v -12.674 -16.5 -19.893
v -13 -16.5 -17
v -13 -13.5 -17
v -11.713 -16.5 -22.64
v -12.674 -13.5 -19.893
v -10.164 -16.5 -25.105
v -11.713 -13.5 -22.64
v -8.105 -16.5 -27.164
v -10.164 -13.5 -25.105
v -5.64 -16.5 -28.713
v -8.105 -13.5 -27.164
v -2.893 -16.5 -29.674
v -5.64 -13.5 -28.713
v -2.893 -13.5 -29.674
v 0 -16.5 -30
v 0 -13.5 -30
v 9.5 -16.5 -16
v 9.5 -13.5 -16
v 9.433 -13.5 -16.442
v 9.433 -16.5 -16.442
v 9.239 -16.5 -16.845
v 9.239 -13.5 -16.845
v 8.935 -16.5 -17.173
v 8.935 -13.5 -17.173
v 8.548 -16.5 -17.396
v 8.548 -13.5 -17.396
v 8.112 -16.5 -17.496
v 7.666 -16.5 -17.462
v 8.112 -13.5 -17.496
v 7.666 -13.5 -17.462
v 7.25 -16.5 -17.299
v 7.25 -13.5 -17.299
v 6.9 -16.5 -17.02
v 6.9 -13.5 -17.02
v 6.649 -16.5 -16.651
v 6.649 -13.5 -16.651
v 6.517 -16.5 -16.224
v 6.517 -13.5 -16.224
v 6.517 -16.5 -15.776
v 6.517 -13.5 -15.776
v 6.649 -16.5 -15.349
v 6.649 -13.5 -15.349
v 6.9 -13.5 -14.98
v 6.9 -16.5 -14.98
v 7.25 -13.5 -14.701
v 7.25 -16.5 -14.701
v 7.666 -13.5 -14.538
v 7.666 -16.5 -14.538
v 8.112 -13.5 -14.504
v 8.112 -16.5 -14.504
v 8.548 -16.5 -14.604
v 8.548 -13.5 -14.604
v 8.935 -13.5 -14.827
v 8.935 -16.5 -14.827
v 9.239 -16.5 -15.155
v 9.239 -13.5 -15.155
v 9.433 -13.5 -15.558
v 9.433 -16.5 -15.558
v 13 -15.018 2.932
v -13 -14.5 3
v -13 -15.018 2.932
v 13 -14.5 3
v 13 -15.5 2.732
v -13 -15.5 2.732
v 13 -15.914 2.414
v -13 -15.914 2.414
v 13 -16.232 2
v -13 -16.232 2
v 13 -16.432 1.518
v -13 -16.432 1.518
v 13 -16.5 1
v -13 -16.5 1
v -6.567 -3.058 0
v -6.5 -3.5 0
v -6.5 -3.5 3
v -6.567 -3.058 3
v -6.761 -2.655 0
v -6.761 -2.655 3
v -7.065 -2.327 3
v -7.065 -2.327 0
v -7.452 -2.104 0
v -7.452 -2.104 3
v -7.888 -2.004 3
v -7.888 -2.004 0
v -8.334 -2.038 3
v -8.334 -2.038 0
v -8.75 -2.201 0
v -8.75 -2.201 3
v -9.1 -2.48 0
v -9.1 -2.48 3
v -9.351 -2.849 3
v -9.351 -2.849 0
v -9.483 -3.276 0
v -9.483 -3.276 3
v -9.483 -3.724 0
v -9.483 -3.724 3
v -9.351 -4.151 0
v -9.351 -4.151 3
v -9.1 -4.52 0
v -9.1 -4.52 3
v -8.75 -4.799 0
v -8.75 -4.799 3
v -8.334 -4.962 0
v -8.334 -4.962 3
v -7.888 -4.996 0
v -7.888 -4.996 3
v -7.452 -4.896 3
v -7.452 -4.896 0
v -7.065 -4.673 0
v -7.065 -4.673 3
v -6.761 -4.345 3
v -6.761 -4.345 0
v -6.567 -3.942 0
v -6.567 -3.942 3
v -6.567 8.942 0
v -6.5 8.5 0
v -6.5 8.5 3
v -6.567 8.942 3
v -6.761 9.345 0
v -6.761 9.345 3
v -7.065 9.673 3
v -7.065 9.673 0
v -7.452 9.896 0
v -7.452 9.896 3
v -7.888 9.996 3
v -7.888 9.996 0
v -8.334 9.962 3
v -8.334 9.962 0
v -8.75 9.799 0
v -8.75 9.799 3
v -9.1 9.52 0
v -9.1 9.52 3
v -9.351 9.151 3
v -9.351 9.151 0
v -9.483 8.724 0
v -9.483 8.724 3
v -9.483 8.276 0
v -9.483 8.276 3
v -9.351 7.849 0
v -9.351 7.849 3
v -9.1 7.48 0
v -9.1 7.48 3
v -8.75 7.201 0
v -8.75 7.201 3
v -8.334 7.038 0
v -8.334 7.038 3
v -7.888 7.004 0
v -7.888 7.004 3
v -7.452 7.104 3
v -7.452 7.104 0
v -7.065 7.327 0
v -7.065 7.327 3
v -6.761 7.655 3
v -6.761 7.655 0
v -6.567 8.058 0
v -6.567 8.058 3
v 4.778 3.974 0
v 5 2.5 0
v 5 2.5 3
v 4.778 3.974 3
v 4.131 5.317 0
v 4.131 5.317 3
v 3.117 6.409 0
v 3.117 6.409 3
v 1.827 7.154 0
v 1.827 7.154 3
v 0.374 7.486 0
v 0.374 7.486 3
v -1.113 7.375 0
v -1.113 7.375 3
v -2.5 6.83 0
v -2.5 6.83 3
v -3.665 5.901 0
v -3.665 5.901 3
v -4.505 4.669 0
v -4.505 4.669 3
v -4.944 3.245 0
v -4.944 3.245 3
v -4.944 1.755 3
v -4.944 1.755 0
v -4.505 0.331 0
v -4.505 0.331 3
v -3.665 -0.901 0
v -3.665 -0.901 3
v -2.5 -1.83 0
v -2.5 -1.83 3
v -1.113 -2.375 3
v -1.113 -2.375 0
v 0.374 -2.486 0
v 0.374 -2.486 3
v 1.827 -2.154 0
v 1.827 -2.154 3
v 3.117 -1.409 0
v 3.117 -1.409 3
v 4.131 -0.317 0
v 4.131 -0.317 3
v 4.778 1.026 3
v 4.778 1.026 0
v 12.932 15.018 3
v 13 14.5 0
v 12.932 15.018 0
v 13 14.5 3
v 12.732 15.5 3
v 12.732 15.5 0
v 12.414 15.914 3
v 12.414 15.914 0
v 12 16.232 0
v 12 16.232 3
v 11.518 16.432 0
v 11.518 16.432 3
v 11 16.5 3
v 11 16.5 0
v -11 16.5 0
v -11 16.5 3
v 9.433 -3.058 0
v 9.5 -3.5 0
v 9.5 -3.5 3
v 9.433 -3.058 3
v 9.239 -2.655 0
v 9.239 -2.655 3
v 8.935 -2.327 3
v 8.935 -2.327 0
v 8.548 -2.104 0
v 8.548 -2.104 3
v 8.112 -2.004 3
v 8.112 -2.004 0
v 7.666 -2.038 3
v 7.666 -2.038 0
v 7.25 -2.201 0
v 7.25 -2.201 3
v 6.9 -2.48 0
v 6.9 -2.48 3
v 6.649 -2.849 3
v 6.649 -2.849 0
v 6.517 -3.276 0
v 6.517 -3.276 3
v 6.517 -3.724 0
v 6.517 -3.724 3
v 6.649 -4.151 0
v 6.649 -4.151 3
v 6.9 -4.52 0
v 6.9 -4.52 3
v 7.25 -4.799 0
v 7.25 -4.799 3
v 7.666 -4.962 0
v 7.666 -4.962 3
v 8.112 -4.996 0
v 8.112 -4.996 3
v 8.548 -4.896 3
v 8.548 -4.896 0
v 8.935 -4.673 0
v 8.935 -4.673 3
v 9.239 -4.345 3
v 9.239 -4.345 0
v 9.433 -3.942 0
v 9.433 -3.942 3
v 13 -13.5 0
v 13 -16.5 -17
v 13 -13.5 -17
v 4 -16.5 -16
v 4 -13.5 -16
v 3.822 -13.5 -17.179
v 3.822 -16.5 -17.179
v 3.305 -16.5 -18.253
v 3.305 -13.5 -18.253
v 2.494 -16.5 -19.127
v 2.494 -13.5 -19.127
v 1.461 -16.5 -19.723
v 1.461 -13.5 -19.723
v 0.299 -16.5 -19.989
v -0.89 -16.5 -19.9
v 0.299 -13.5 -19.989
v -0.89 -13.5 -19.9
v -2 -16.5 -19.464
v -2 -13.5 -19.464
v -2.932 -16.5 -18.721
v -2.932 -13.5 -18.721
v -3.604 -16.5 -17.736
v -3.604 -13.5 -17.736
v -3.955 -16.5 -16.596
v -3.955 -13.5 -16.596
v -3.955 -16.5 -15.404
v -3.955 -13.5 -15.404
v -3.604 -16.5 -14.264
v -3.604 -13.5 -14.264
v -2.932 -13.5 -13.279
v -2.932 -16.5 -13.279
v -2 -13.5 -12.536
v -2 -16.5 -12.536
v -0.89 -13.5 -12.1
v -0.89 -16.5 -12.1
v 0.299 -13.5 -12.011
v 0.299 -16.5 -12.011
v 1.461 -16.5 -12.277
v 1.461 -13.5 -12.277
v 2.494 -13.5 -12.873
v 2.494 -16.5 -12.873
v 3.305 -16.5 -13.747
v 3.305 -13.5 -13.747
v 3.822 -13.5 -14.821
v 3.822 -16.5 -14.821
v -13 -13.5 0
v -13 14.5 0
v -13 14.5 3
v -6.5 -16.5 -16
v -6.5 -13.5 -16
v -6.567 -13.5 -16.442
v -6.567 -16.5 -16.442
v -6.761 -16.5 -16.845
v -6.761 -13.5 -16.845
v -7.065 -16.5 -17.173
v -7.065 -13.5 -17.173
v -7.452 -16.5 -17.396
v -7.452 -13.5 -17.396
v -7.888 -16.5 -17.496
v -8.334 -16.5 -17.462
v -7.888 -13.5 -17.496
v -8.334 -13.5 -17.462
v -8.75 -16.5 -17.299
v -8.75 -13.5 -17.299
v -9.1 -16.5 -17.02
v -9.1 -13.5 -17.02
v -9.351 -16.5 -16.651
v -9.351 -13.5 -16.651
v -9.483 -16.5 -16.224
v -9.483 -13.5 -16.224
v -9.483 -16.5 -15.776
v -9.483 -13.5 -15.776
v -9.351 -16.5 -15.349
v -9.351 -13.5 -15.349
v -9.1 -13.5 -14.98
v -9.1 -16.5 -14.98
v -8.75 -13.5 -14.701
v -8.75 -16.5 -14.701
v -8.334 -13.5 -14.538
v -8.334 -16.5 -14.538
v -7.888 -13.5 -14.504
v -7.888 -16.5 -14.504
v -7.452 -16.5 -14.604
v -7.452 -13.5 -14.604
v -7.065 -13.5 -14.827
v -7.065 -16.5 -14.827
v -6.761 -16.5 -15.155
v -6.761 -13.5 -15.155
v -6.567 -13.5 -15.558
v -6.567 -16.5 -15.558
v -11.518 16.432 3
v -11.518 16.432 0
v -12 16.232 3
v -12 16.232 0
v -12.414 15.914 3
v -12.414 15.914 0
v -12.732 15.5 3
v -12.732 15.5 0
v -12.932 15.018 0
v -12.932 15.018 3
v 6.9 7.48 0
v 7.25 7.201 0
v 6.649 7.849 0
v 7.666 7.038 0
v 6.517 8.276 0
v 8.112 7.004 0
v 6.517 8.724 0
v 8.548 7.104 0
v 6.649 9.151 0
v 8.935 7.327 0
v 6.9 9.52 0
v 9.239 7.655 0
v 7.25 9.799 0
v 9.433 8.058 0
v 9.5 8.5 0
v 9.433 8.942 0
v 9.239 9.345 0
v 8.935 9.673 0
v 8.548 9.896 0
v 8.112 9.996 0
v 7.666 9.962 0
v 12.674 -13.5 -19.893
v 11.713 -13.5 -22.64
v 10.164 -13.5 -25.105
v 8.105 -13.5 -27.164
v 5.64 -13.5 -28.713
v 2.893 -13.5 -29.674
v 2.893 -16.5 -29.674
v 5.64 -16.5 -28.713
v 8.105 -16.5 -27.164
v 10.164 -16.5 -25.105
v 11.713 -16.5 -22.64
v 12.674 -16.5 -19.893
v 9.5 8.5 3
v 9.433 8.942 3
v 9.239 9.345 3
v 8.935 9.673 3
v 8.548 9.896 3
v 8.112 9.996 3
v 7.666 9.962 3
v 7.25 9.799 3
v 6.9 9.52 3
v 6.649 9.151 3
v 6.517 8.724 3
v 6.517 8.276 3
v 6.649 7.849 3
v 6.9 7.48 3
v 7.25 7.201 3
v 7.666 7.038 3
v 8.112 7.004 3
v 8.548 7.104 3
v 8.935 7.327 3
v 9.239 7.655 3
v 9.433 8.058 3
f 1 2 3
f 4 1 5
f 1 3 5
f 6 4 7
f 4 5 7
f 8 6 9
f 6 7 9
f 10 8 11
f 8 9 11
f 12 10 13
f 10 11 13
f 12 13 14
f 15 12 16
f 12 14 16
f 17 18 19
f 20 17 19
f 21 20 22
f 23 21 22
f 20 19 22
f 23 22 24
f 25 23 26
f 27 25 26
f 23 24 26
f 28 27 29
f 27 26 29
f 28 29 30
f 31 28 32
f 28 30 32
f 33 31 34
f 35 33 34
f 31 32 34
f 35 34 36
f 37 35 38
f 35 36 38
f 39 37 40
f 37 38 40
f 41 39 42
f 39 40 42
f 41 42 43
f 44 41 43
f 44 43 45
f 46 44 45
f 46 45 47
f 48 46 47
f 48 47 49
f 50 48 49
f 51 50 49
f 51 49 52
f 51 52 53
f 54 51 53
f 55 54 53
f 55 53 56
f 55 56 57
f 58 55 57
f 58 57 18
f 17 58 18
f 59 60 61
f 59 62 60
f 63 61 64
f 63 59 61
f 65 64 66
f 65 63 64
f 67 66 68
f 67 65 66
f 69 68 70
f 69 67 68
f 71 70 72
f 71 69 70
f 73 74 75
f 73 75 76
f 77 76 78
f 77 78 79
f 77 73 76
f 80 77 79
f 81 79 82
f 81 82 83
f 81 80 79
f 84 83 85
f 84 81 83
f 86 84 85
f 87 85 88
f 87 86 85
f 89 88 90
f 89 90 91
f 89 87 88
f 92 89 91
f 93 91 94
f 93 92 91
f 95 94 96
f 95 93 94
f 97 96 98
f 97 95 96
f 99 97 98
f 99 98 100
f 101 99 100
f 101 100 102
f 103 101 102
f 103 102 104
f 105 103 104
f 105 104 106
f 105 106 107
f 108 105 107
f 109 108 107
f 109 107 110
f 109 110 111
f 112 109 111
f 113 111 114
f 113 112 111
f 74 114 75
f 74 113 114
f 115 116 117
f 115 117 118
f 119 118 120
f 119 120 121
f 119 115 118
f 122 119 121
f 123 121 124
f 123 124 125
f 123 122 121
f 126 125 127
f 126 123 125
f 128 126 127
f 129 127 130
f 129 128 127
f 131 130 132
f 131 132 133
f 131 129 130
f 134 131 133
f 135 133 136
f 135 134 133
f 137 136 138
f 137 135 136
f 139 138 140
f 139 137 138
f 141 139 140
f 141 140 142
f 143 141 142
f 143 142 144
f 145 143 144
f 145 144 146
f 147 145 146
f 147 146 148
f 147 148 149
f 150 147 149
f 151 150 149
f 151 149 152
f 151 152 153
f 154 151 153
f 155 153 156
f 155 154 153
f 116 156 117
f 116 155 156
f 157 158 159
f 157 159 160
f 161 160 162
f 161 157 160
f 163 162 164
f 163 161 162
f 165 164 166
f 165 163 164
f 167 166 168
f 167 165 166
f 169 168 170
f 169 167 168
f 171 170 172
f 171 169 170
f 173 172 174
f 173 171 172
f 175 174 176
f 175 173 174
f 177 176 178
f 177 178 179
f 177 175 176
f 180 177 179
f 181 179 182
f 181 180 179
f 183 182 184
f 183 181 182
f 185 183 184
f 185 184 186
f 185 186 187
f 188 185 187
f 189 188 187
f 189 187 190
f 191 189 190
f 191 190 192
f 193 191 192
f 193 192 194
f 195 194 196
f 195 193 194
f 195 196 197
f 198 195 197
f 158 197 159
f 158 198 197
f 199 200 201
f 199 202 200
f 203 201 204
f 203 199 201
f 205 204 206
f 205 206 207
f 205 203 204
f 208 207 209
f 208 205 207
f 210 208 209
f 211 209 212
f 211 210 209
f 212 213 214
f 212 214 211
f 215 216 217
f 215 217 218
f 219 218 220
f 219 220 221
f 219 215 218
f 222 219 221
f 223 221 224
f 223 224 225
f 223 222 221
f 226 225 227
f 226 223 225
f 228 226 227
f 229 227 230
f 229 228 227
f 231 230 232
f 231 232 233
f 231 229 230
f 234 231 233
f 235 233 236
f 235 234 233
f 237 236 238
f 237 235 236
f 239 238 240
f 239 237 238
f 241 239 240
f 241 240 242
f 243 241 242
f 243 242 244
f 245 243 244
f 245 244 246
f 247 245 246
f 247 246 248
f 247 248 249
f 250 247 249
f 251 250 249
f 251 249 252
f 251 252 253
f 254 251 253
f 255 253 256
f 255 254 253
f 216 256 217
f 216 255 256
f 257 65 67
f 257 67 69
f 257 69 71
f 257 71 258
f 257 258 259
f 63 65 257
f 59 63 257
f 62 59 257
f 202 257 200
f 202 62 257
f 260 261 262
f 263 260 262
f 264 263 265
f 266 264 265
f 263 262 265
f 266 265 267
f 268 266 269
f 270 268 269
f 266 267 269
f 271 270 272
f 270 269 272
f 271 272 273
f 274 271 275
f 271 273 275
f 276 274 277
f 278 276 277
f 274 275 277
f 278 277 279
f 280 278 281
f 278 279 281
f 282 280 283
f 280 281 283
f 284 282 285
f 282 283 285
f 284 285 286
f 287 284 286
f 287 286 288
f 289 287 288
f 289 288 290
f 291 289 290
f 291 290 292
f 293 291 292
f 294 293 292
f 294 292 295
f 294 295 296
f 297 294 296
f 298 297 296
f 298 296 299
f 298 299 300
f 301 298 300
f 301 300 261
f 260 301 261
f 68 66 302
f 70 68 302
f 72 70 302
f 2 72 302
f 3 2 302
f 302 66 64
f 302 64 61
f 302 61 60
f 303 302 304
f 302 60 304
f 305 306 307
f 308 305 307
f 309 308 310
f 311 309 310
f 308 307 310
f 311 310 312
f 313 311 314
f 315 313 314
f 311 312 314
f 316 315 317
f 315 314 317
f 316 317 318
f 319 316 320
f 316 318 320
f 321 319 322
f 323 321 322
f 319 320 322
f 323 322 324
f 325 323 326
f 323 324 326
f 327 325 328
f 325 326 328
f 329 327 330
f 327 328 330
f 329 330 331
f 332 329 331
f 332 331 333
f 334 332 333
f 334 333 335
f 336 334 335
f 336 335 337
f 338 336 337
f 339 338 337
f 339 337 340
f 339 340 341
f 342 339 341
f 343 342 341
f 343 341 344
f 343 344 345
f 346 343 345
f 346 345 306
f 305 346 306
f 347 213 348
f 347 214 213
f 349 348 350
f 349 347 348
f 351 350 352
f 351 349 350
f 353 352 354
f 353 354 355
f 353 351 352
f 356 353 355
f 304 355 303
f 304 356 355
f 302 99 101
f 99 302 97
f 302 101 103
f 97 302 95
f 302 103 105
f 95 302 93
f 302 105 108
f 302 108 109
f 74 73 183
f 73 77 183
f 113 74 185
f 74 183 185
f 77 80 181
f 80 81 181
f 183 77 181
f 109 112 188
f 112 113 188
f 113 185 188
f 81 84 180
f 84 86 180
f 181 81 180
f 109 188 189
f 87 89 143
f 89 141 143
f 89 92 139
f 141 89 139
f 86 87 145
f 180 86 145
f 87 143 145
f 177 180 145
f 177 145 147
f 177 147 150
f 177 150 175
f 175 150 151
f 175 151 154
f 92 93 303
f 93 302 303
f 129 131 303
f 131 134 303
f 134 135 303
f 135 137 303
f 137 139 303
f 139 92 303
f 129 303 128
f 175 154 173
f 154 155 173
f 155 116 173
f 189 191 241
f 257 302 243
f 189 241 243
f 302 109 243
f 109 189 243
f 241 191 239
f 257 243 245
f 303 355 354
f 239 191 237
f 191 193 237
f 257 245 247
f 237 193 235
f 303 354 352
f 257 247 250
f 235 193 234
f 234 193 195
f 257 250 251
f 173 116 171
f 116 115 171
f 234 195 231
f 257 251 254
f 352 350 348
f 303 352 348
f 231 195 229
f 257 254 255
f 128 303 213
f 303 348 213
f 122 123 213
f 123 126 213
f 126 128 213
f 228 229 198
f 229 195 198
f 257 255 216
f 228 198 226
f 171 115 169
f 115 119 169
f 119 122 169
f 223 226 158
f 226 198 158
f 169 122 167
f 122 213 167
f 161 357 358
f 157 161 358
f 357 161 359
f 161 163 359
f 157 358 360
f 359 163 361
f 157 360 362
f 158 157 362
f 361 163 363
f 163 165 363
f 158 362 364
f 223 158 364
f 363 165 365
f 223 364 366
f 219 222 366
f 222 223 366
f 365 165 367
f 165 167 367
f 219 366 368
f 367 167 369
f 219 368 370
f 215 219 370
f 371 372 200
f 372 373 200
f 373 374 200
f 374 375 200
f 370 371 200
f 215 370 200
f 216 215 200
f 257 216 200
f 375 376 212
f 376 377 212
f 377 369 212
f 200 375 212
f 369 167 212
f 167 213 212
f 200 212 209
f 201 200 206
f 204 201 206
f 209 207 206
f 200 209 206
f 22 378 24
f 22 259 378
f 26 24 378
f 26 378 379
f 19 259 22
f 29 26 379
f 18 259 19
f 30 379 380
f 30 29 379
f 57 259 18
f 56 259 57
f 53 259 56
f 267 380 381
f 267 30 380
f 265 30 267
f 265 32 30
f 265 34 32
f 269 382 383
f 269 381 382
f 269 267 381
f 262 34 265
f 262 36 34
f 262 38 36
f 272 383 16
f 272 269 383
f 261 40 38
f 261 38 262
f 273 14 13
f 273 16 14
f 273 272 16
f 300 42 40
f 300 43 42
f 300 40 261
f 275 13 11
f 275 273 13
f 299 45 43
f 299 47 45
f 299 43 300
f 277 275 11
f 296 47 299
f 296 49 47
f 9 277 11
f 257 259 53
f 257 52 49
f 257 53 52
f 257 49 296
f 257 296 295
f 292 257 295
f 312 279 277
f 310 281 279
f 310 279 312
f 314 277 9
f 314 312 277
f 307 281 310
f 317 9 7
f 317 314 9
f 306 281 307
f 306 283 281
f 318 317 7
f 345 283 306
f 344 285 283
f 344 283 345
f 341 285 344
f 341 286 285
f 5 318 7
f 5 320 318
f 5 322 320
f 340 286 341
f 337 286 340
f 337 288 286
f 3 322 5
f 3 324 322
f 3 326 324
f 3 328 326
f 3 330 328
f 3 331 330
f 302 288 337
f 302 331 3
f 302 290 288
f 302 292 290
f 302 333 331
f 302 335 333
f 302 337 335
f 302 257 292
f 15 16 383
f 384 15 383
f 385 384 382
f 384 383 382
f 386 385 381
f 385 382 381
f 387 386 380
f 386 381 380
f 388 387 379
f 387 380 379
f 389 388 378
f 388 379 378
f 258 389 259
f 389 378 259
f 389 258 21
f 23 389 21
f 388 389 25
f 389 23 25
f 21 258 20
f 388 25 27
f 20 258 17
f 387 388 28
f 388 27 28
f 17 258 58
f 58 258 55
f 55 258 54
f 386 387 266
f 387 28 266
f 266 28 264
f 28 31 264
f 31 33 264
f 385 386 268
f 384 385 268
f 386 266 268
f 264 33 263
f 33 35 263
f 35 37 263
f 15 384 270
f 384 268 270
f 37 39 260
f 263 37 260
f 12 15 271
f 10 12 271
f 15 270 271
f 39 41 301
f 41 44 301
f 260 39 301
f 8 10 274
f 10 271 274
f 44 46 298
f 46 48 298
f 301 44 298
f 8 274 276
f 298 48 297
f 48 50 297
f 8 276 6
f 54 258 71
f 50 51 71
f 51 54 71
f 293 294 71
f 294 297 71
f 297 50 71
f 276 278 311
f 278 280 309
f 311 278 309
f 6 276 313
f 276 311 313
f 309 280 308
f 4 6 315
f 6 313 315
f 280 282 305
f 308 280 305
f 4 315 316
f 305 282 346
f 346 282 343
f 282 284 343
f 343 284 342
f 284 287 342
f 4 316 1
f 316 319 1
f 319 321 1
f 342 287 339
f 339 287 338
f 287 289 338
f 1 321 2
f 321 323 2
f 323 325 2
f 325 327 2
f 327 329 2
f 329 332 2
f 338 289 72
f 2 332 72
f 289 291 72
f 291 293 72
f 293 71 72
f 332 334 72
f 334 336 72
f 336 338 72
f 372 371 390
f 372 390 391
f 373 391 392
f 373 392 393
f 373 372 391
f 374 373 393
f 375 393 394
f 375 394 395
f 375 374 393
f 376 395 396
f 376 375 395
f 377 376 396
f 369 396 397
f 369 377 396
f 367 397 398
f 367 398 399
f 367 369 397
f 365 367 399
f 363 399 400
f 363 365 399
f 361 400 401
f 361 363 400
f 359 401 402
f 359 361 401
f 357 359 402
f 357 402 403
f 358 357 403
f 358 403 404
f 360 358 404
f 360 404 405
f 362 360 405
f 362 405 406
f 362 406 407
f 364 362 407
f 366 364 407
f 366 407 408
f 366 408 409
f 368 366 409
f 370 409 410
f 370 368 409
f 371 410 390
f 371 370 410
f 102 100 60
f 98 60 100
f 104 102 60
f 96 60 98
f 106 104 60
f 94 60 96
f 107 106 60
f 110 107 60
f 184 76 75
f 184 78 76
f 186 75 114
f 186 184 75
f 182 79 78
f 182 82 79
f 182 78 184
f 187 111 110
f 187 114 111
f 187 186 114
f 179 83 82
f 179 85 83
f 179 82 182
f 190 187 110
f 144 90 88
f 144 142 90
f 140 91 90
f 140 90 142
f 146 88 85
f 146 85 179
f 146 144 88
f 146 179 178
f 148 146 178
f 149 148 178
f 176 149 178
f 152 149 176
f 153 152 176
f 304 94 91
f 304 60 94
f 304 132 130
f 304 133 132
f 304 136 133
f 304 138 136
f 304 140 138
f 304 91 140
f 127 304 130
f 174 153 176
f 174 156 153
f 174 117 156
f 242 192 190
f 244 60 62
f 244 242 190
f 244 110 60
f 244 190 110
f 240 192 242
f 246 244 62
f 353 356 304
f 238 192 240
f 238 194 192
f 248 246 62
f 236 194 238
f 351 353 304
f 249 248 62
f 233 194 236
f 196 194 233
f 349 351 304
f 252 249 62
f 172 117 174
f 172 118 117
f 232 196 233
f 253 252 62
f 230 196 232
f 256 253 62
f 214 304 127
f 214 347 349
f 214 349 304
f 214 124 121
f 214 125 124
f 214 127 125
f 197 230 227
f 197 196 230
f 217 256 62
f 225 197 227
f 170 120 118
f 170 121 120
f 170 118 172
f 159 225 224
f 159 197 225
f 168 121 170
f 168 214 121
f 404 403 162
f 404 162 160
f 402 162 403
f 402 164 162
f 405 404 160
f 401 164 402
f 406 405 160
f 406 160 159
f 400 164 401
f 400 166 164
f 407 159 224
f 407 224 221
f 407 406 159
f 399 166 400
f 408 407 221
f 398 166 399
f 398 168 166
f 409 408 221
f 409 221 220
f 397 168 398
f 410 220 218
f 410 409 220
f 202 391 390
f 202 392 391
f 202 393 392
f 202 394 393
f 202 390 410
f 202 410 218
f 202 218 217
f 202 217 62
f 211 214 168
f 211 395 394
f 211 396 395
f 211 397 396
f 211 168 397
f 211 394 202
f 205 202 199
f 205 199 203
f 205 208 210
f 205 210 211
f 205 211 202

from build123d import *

# Parameters (mm, degrees)
SKETCH1_W           = 26
SKETCH1_H           = 33
SKETCH1_R           = 5
SKETCH1_R_2         = 1.5
BOSS_EXTRUDE1_DEPTH = 3
SKETCH2_W           = 26
SKETCH2_H           = 3
BOSS_EXTRUDE2_DEPTH = 30
SKETCH3_R           = 4
SKETCH3_R_2         = 1.5
CUT_EXTRUDE1_DEPTH  = 4
FILLET1_R           = 2
FILLET2_R           = 2


with BuildPart() as part:
    # Sketch1 → Boss-Extrude1 (new body)
    with BuildSketch(Plane.XY):
        Rectangle(SKETCH1_W, SKETCH1_H)
        with Locations((0, 2.5)):
            Circle(SKETCH1_R, mode=Mode.SUBTRACT)
        with Locations((-8, 8.5)):
            Circle(SKETCH1_R_2, mode=Mode.SUBTRACT)
        with Locations((8, 8.5)):
            Circle(SKETCH1_R_2, mode=Mode.SUBTRACT)
        with Locations((8, -3.5)):
            Circle(SKETCH1_R_2, mode=Mode.SUBTRACT)
        with Locations((-8, -3.5)):
            Circle(SKETCH1_R_2, mode=Mode.SUBTRACT)
    extrude(amount=BOSS_EXTRUDE1_DEPTH)

    # Sketch2 → Boss-Extrude2 (add)
    with BuildSketch(Plane(origin=(0, 0, 0), x_dir=(-1, 0, 0), z_dir=(0, 0, -1))):
        with Locations((0, -15)):
            Rectangle(SKETCH2_W, SKETCH2_H)
    extrude(amount=BOSS_EXTRUDE2_DEPTH)

    # Sketch3 → Cut-Extrude1 (cut, through all)
    with BuildSketch(Plane(origin=(0, -13.5, 0), x_dir=(1, 0, 0), z_dir=(0, 1, 0))):
        with BuildLine():
            Line((0, 30), (-13, 30))
            Line((-13, 30), (-13, 17))
            ThreePointArc((-13, 17), (-9.192388155, 26.192388155), (0, 30))
        make_face()
        with BuildLine():
            Line((13, 30), (0, 30))
            ThreePointArc((0, 30), (9.192388162, 26.192388149), (13, 16.999999981))
            Line((13, 16.999999981), (13, 30))
        make_face()
        with Locations((0, 16)):
            Circle(SKETCH3_R)
        with Locations((-8, 16)):
            Circle(SKETCH3_R_2)
        with Locations((8, 16)):
            Circle(SKETCH3_R_2)
    extrude(amount=-CUT_EXTRUDE1_DEPTH, mode=Mode.SUBTRACT)

    # Fillet1
    fillet1_edges = [part.edges().sort_by_distance(p)[0] for p in [
        (-13, 16.5, 1.5),
        (13, 16.5, 1.5),
    ]]
    fillet(fillet1_edges, radius=FILLET1_R)

    # Fillet2
    fillet2_edges = [part.edges().sort_by_distance(p)[0] for p in [
        (0, -16.5, 3),
    ]]
    fillet(fillet2_edges, radius=FILLET2_R)


solid = part.part
